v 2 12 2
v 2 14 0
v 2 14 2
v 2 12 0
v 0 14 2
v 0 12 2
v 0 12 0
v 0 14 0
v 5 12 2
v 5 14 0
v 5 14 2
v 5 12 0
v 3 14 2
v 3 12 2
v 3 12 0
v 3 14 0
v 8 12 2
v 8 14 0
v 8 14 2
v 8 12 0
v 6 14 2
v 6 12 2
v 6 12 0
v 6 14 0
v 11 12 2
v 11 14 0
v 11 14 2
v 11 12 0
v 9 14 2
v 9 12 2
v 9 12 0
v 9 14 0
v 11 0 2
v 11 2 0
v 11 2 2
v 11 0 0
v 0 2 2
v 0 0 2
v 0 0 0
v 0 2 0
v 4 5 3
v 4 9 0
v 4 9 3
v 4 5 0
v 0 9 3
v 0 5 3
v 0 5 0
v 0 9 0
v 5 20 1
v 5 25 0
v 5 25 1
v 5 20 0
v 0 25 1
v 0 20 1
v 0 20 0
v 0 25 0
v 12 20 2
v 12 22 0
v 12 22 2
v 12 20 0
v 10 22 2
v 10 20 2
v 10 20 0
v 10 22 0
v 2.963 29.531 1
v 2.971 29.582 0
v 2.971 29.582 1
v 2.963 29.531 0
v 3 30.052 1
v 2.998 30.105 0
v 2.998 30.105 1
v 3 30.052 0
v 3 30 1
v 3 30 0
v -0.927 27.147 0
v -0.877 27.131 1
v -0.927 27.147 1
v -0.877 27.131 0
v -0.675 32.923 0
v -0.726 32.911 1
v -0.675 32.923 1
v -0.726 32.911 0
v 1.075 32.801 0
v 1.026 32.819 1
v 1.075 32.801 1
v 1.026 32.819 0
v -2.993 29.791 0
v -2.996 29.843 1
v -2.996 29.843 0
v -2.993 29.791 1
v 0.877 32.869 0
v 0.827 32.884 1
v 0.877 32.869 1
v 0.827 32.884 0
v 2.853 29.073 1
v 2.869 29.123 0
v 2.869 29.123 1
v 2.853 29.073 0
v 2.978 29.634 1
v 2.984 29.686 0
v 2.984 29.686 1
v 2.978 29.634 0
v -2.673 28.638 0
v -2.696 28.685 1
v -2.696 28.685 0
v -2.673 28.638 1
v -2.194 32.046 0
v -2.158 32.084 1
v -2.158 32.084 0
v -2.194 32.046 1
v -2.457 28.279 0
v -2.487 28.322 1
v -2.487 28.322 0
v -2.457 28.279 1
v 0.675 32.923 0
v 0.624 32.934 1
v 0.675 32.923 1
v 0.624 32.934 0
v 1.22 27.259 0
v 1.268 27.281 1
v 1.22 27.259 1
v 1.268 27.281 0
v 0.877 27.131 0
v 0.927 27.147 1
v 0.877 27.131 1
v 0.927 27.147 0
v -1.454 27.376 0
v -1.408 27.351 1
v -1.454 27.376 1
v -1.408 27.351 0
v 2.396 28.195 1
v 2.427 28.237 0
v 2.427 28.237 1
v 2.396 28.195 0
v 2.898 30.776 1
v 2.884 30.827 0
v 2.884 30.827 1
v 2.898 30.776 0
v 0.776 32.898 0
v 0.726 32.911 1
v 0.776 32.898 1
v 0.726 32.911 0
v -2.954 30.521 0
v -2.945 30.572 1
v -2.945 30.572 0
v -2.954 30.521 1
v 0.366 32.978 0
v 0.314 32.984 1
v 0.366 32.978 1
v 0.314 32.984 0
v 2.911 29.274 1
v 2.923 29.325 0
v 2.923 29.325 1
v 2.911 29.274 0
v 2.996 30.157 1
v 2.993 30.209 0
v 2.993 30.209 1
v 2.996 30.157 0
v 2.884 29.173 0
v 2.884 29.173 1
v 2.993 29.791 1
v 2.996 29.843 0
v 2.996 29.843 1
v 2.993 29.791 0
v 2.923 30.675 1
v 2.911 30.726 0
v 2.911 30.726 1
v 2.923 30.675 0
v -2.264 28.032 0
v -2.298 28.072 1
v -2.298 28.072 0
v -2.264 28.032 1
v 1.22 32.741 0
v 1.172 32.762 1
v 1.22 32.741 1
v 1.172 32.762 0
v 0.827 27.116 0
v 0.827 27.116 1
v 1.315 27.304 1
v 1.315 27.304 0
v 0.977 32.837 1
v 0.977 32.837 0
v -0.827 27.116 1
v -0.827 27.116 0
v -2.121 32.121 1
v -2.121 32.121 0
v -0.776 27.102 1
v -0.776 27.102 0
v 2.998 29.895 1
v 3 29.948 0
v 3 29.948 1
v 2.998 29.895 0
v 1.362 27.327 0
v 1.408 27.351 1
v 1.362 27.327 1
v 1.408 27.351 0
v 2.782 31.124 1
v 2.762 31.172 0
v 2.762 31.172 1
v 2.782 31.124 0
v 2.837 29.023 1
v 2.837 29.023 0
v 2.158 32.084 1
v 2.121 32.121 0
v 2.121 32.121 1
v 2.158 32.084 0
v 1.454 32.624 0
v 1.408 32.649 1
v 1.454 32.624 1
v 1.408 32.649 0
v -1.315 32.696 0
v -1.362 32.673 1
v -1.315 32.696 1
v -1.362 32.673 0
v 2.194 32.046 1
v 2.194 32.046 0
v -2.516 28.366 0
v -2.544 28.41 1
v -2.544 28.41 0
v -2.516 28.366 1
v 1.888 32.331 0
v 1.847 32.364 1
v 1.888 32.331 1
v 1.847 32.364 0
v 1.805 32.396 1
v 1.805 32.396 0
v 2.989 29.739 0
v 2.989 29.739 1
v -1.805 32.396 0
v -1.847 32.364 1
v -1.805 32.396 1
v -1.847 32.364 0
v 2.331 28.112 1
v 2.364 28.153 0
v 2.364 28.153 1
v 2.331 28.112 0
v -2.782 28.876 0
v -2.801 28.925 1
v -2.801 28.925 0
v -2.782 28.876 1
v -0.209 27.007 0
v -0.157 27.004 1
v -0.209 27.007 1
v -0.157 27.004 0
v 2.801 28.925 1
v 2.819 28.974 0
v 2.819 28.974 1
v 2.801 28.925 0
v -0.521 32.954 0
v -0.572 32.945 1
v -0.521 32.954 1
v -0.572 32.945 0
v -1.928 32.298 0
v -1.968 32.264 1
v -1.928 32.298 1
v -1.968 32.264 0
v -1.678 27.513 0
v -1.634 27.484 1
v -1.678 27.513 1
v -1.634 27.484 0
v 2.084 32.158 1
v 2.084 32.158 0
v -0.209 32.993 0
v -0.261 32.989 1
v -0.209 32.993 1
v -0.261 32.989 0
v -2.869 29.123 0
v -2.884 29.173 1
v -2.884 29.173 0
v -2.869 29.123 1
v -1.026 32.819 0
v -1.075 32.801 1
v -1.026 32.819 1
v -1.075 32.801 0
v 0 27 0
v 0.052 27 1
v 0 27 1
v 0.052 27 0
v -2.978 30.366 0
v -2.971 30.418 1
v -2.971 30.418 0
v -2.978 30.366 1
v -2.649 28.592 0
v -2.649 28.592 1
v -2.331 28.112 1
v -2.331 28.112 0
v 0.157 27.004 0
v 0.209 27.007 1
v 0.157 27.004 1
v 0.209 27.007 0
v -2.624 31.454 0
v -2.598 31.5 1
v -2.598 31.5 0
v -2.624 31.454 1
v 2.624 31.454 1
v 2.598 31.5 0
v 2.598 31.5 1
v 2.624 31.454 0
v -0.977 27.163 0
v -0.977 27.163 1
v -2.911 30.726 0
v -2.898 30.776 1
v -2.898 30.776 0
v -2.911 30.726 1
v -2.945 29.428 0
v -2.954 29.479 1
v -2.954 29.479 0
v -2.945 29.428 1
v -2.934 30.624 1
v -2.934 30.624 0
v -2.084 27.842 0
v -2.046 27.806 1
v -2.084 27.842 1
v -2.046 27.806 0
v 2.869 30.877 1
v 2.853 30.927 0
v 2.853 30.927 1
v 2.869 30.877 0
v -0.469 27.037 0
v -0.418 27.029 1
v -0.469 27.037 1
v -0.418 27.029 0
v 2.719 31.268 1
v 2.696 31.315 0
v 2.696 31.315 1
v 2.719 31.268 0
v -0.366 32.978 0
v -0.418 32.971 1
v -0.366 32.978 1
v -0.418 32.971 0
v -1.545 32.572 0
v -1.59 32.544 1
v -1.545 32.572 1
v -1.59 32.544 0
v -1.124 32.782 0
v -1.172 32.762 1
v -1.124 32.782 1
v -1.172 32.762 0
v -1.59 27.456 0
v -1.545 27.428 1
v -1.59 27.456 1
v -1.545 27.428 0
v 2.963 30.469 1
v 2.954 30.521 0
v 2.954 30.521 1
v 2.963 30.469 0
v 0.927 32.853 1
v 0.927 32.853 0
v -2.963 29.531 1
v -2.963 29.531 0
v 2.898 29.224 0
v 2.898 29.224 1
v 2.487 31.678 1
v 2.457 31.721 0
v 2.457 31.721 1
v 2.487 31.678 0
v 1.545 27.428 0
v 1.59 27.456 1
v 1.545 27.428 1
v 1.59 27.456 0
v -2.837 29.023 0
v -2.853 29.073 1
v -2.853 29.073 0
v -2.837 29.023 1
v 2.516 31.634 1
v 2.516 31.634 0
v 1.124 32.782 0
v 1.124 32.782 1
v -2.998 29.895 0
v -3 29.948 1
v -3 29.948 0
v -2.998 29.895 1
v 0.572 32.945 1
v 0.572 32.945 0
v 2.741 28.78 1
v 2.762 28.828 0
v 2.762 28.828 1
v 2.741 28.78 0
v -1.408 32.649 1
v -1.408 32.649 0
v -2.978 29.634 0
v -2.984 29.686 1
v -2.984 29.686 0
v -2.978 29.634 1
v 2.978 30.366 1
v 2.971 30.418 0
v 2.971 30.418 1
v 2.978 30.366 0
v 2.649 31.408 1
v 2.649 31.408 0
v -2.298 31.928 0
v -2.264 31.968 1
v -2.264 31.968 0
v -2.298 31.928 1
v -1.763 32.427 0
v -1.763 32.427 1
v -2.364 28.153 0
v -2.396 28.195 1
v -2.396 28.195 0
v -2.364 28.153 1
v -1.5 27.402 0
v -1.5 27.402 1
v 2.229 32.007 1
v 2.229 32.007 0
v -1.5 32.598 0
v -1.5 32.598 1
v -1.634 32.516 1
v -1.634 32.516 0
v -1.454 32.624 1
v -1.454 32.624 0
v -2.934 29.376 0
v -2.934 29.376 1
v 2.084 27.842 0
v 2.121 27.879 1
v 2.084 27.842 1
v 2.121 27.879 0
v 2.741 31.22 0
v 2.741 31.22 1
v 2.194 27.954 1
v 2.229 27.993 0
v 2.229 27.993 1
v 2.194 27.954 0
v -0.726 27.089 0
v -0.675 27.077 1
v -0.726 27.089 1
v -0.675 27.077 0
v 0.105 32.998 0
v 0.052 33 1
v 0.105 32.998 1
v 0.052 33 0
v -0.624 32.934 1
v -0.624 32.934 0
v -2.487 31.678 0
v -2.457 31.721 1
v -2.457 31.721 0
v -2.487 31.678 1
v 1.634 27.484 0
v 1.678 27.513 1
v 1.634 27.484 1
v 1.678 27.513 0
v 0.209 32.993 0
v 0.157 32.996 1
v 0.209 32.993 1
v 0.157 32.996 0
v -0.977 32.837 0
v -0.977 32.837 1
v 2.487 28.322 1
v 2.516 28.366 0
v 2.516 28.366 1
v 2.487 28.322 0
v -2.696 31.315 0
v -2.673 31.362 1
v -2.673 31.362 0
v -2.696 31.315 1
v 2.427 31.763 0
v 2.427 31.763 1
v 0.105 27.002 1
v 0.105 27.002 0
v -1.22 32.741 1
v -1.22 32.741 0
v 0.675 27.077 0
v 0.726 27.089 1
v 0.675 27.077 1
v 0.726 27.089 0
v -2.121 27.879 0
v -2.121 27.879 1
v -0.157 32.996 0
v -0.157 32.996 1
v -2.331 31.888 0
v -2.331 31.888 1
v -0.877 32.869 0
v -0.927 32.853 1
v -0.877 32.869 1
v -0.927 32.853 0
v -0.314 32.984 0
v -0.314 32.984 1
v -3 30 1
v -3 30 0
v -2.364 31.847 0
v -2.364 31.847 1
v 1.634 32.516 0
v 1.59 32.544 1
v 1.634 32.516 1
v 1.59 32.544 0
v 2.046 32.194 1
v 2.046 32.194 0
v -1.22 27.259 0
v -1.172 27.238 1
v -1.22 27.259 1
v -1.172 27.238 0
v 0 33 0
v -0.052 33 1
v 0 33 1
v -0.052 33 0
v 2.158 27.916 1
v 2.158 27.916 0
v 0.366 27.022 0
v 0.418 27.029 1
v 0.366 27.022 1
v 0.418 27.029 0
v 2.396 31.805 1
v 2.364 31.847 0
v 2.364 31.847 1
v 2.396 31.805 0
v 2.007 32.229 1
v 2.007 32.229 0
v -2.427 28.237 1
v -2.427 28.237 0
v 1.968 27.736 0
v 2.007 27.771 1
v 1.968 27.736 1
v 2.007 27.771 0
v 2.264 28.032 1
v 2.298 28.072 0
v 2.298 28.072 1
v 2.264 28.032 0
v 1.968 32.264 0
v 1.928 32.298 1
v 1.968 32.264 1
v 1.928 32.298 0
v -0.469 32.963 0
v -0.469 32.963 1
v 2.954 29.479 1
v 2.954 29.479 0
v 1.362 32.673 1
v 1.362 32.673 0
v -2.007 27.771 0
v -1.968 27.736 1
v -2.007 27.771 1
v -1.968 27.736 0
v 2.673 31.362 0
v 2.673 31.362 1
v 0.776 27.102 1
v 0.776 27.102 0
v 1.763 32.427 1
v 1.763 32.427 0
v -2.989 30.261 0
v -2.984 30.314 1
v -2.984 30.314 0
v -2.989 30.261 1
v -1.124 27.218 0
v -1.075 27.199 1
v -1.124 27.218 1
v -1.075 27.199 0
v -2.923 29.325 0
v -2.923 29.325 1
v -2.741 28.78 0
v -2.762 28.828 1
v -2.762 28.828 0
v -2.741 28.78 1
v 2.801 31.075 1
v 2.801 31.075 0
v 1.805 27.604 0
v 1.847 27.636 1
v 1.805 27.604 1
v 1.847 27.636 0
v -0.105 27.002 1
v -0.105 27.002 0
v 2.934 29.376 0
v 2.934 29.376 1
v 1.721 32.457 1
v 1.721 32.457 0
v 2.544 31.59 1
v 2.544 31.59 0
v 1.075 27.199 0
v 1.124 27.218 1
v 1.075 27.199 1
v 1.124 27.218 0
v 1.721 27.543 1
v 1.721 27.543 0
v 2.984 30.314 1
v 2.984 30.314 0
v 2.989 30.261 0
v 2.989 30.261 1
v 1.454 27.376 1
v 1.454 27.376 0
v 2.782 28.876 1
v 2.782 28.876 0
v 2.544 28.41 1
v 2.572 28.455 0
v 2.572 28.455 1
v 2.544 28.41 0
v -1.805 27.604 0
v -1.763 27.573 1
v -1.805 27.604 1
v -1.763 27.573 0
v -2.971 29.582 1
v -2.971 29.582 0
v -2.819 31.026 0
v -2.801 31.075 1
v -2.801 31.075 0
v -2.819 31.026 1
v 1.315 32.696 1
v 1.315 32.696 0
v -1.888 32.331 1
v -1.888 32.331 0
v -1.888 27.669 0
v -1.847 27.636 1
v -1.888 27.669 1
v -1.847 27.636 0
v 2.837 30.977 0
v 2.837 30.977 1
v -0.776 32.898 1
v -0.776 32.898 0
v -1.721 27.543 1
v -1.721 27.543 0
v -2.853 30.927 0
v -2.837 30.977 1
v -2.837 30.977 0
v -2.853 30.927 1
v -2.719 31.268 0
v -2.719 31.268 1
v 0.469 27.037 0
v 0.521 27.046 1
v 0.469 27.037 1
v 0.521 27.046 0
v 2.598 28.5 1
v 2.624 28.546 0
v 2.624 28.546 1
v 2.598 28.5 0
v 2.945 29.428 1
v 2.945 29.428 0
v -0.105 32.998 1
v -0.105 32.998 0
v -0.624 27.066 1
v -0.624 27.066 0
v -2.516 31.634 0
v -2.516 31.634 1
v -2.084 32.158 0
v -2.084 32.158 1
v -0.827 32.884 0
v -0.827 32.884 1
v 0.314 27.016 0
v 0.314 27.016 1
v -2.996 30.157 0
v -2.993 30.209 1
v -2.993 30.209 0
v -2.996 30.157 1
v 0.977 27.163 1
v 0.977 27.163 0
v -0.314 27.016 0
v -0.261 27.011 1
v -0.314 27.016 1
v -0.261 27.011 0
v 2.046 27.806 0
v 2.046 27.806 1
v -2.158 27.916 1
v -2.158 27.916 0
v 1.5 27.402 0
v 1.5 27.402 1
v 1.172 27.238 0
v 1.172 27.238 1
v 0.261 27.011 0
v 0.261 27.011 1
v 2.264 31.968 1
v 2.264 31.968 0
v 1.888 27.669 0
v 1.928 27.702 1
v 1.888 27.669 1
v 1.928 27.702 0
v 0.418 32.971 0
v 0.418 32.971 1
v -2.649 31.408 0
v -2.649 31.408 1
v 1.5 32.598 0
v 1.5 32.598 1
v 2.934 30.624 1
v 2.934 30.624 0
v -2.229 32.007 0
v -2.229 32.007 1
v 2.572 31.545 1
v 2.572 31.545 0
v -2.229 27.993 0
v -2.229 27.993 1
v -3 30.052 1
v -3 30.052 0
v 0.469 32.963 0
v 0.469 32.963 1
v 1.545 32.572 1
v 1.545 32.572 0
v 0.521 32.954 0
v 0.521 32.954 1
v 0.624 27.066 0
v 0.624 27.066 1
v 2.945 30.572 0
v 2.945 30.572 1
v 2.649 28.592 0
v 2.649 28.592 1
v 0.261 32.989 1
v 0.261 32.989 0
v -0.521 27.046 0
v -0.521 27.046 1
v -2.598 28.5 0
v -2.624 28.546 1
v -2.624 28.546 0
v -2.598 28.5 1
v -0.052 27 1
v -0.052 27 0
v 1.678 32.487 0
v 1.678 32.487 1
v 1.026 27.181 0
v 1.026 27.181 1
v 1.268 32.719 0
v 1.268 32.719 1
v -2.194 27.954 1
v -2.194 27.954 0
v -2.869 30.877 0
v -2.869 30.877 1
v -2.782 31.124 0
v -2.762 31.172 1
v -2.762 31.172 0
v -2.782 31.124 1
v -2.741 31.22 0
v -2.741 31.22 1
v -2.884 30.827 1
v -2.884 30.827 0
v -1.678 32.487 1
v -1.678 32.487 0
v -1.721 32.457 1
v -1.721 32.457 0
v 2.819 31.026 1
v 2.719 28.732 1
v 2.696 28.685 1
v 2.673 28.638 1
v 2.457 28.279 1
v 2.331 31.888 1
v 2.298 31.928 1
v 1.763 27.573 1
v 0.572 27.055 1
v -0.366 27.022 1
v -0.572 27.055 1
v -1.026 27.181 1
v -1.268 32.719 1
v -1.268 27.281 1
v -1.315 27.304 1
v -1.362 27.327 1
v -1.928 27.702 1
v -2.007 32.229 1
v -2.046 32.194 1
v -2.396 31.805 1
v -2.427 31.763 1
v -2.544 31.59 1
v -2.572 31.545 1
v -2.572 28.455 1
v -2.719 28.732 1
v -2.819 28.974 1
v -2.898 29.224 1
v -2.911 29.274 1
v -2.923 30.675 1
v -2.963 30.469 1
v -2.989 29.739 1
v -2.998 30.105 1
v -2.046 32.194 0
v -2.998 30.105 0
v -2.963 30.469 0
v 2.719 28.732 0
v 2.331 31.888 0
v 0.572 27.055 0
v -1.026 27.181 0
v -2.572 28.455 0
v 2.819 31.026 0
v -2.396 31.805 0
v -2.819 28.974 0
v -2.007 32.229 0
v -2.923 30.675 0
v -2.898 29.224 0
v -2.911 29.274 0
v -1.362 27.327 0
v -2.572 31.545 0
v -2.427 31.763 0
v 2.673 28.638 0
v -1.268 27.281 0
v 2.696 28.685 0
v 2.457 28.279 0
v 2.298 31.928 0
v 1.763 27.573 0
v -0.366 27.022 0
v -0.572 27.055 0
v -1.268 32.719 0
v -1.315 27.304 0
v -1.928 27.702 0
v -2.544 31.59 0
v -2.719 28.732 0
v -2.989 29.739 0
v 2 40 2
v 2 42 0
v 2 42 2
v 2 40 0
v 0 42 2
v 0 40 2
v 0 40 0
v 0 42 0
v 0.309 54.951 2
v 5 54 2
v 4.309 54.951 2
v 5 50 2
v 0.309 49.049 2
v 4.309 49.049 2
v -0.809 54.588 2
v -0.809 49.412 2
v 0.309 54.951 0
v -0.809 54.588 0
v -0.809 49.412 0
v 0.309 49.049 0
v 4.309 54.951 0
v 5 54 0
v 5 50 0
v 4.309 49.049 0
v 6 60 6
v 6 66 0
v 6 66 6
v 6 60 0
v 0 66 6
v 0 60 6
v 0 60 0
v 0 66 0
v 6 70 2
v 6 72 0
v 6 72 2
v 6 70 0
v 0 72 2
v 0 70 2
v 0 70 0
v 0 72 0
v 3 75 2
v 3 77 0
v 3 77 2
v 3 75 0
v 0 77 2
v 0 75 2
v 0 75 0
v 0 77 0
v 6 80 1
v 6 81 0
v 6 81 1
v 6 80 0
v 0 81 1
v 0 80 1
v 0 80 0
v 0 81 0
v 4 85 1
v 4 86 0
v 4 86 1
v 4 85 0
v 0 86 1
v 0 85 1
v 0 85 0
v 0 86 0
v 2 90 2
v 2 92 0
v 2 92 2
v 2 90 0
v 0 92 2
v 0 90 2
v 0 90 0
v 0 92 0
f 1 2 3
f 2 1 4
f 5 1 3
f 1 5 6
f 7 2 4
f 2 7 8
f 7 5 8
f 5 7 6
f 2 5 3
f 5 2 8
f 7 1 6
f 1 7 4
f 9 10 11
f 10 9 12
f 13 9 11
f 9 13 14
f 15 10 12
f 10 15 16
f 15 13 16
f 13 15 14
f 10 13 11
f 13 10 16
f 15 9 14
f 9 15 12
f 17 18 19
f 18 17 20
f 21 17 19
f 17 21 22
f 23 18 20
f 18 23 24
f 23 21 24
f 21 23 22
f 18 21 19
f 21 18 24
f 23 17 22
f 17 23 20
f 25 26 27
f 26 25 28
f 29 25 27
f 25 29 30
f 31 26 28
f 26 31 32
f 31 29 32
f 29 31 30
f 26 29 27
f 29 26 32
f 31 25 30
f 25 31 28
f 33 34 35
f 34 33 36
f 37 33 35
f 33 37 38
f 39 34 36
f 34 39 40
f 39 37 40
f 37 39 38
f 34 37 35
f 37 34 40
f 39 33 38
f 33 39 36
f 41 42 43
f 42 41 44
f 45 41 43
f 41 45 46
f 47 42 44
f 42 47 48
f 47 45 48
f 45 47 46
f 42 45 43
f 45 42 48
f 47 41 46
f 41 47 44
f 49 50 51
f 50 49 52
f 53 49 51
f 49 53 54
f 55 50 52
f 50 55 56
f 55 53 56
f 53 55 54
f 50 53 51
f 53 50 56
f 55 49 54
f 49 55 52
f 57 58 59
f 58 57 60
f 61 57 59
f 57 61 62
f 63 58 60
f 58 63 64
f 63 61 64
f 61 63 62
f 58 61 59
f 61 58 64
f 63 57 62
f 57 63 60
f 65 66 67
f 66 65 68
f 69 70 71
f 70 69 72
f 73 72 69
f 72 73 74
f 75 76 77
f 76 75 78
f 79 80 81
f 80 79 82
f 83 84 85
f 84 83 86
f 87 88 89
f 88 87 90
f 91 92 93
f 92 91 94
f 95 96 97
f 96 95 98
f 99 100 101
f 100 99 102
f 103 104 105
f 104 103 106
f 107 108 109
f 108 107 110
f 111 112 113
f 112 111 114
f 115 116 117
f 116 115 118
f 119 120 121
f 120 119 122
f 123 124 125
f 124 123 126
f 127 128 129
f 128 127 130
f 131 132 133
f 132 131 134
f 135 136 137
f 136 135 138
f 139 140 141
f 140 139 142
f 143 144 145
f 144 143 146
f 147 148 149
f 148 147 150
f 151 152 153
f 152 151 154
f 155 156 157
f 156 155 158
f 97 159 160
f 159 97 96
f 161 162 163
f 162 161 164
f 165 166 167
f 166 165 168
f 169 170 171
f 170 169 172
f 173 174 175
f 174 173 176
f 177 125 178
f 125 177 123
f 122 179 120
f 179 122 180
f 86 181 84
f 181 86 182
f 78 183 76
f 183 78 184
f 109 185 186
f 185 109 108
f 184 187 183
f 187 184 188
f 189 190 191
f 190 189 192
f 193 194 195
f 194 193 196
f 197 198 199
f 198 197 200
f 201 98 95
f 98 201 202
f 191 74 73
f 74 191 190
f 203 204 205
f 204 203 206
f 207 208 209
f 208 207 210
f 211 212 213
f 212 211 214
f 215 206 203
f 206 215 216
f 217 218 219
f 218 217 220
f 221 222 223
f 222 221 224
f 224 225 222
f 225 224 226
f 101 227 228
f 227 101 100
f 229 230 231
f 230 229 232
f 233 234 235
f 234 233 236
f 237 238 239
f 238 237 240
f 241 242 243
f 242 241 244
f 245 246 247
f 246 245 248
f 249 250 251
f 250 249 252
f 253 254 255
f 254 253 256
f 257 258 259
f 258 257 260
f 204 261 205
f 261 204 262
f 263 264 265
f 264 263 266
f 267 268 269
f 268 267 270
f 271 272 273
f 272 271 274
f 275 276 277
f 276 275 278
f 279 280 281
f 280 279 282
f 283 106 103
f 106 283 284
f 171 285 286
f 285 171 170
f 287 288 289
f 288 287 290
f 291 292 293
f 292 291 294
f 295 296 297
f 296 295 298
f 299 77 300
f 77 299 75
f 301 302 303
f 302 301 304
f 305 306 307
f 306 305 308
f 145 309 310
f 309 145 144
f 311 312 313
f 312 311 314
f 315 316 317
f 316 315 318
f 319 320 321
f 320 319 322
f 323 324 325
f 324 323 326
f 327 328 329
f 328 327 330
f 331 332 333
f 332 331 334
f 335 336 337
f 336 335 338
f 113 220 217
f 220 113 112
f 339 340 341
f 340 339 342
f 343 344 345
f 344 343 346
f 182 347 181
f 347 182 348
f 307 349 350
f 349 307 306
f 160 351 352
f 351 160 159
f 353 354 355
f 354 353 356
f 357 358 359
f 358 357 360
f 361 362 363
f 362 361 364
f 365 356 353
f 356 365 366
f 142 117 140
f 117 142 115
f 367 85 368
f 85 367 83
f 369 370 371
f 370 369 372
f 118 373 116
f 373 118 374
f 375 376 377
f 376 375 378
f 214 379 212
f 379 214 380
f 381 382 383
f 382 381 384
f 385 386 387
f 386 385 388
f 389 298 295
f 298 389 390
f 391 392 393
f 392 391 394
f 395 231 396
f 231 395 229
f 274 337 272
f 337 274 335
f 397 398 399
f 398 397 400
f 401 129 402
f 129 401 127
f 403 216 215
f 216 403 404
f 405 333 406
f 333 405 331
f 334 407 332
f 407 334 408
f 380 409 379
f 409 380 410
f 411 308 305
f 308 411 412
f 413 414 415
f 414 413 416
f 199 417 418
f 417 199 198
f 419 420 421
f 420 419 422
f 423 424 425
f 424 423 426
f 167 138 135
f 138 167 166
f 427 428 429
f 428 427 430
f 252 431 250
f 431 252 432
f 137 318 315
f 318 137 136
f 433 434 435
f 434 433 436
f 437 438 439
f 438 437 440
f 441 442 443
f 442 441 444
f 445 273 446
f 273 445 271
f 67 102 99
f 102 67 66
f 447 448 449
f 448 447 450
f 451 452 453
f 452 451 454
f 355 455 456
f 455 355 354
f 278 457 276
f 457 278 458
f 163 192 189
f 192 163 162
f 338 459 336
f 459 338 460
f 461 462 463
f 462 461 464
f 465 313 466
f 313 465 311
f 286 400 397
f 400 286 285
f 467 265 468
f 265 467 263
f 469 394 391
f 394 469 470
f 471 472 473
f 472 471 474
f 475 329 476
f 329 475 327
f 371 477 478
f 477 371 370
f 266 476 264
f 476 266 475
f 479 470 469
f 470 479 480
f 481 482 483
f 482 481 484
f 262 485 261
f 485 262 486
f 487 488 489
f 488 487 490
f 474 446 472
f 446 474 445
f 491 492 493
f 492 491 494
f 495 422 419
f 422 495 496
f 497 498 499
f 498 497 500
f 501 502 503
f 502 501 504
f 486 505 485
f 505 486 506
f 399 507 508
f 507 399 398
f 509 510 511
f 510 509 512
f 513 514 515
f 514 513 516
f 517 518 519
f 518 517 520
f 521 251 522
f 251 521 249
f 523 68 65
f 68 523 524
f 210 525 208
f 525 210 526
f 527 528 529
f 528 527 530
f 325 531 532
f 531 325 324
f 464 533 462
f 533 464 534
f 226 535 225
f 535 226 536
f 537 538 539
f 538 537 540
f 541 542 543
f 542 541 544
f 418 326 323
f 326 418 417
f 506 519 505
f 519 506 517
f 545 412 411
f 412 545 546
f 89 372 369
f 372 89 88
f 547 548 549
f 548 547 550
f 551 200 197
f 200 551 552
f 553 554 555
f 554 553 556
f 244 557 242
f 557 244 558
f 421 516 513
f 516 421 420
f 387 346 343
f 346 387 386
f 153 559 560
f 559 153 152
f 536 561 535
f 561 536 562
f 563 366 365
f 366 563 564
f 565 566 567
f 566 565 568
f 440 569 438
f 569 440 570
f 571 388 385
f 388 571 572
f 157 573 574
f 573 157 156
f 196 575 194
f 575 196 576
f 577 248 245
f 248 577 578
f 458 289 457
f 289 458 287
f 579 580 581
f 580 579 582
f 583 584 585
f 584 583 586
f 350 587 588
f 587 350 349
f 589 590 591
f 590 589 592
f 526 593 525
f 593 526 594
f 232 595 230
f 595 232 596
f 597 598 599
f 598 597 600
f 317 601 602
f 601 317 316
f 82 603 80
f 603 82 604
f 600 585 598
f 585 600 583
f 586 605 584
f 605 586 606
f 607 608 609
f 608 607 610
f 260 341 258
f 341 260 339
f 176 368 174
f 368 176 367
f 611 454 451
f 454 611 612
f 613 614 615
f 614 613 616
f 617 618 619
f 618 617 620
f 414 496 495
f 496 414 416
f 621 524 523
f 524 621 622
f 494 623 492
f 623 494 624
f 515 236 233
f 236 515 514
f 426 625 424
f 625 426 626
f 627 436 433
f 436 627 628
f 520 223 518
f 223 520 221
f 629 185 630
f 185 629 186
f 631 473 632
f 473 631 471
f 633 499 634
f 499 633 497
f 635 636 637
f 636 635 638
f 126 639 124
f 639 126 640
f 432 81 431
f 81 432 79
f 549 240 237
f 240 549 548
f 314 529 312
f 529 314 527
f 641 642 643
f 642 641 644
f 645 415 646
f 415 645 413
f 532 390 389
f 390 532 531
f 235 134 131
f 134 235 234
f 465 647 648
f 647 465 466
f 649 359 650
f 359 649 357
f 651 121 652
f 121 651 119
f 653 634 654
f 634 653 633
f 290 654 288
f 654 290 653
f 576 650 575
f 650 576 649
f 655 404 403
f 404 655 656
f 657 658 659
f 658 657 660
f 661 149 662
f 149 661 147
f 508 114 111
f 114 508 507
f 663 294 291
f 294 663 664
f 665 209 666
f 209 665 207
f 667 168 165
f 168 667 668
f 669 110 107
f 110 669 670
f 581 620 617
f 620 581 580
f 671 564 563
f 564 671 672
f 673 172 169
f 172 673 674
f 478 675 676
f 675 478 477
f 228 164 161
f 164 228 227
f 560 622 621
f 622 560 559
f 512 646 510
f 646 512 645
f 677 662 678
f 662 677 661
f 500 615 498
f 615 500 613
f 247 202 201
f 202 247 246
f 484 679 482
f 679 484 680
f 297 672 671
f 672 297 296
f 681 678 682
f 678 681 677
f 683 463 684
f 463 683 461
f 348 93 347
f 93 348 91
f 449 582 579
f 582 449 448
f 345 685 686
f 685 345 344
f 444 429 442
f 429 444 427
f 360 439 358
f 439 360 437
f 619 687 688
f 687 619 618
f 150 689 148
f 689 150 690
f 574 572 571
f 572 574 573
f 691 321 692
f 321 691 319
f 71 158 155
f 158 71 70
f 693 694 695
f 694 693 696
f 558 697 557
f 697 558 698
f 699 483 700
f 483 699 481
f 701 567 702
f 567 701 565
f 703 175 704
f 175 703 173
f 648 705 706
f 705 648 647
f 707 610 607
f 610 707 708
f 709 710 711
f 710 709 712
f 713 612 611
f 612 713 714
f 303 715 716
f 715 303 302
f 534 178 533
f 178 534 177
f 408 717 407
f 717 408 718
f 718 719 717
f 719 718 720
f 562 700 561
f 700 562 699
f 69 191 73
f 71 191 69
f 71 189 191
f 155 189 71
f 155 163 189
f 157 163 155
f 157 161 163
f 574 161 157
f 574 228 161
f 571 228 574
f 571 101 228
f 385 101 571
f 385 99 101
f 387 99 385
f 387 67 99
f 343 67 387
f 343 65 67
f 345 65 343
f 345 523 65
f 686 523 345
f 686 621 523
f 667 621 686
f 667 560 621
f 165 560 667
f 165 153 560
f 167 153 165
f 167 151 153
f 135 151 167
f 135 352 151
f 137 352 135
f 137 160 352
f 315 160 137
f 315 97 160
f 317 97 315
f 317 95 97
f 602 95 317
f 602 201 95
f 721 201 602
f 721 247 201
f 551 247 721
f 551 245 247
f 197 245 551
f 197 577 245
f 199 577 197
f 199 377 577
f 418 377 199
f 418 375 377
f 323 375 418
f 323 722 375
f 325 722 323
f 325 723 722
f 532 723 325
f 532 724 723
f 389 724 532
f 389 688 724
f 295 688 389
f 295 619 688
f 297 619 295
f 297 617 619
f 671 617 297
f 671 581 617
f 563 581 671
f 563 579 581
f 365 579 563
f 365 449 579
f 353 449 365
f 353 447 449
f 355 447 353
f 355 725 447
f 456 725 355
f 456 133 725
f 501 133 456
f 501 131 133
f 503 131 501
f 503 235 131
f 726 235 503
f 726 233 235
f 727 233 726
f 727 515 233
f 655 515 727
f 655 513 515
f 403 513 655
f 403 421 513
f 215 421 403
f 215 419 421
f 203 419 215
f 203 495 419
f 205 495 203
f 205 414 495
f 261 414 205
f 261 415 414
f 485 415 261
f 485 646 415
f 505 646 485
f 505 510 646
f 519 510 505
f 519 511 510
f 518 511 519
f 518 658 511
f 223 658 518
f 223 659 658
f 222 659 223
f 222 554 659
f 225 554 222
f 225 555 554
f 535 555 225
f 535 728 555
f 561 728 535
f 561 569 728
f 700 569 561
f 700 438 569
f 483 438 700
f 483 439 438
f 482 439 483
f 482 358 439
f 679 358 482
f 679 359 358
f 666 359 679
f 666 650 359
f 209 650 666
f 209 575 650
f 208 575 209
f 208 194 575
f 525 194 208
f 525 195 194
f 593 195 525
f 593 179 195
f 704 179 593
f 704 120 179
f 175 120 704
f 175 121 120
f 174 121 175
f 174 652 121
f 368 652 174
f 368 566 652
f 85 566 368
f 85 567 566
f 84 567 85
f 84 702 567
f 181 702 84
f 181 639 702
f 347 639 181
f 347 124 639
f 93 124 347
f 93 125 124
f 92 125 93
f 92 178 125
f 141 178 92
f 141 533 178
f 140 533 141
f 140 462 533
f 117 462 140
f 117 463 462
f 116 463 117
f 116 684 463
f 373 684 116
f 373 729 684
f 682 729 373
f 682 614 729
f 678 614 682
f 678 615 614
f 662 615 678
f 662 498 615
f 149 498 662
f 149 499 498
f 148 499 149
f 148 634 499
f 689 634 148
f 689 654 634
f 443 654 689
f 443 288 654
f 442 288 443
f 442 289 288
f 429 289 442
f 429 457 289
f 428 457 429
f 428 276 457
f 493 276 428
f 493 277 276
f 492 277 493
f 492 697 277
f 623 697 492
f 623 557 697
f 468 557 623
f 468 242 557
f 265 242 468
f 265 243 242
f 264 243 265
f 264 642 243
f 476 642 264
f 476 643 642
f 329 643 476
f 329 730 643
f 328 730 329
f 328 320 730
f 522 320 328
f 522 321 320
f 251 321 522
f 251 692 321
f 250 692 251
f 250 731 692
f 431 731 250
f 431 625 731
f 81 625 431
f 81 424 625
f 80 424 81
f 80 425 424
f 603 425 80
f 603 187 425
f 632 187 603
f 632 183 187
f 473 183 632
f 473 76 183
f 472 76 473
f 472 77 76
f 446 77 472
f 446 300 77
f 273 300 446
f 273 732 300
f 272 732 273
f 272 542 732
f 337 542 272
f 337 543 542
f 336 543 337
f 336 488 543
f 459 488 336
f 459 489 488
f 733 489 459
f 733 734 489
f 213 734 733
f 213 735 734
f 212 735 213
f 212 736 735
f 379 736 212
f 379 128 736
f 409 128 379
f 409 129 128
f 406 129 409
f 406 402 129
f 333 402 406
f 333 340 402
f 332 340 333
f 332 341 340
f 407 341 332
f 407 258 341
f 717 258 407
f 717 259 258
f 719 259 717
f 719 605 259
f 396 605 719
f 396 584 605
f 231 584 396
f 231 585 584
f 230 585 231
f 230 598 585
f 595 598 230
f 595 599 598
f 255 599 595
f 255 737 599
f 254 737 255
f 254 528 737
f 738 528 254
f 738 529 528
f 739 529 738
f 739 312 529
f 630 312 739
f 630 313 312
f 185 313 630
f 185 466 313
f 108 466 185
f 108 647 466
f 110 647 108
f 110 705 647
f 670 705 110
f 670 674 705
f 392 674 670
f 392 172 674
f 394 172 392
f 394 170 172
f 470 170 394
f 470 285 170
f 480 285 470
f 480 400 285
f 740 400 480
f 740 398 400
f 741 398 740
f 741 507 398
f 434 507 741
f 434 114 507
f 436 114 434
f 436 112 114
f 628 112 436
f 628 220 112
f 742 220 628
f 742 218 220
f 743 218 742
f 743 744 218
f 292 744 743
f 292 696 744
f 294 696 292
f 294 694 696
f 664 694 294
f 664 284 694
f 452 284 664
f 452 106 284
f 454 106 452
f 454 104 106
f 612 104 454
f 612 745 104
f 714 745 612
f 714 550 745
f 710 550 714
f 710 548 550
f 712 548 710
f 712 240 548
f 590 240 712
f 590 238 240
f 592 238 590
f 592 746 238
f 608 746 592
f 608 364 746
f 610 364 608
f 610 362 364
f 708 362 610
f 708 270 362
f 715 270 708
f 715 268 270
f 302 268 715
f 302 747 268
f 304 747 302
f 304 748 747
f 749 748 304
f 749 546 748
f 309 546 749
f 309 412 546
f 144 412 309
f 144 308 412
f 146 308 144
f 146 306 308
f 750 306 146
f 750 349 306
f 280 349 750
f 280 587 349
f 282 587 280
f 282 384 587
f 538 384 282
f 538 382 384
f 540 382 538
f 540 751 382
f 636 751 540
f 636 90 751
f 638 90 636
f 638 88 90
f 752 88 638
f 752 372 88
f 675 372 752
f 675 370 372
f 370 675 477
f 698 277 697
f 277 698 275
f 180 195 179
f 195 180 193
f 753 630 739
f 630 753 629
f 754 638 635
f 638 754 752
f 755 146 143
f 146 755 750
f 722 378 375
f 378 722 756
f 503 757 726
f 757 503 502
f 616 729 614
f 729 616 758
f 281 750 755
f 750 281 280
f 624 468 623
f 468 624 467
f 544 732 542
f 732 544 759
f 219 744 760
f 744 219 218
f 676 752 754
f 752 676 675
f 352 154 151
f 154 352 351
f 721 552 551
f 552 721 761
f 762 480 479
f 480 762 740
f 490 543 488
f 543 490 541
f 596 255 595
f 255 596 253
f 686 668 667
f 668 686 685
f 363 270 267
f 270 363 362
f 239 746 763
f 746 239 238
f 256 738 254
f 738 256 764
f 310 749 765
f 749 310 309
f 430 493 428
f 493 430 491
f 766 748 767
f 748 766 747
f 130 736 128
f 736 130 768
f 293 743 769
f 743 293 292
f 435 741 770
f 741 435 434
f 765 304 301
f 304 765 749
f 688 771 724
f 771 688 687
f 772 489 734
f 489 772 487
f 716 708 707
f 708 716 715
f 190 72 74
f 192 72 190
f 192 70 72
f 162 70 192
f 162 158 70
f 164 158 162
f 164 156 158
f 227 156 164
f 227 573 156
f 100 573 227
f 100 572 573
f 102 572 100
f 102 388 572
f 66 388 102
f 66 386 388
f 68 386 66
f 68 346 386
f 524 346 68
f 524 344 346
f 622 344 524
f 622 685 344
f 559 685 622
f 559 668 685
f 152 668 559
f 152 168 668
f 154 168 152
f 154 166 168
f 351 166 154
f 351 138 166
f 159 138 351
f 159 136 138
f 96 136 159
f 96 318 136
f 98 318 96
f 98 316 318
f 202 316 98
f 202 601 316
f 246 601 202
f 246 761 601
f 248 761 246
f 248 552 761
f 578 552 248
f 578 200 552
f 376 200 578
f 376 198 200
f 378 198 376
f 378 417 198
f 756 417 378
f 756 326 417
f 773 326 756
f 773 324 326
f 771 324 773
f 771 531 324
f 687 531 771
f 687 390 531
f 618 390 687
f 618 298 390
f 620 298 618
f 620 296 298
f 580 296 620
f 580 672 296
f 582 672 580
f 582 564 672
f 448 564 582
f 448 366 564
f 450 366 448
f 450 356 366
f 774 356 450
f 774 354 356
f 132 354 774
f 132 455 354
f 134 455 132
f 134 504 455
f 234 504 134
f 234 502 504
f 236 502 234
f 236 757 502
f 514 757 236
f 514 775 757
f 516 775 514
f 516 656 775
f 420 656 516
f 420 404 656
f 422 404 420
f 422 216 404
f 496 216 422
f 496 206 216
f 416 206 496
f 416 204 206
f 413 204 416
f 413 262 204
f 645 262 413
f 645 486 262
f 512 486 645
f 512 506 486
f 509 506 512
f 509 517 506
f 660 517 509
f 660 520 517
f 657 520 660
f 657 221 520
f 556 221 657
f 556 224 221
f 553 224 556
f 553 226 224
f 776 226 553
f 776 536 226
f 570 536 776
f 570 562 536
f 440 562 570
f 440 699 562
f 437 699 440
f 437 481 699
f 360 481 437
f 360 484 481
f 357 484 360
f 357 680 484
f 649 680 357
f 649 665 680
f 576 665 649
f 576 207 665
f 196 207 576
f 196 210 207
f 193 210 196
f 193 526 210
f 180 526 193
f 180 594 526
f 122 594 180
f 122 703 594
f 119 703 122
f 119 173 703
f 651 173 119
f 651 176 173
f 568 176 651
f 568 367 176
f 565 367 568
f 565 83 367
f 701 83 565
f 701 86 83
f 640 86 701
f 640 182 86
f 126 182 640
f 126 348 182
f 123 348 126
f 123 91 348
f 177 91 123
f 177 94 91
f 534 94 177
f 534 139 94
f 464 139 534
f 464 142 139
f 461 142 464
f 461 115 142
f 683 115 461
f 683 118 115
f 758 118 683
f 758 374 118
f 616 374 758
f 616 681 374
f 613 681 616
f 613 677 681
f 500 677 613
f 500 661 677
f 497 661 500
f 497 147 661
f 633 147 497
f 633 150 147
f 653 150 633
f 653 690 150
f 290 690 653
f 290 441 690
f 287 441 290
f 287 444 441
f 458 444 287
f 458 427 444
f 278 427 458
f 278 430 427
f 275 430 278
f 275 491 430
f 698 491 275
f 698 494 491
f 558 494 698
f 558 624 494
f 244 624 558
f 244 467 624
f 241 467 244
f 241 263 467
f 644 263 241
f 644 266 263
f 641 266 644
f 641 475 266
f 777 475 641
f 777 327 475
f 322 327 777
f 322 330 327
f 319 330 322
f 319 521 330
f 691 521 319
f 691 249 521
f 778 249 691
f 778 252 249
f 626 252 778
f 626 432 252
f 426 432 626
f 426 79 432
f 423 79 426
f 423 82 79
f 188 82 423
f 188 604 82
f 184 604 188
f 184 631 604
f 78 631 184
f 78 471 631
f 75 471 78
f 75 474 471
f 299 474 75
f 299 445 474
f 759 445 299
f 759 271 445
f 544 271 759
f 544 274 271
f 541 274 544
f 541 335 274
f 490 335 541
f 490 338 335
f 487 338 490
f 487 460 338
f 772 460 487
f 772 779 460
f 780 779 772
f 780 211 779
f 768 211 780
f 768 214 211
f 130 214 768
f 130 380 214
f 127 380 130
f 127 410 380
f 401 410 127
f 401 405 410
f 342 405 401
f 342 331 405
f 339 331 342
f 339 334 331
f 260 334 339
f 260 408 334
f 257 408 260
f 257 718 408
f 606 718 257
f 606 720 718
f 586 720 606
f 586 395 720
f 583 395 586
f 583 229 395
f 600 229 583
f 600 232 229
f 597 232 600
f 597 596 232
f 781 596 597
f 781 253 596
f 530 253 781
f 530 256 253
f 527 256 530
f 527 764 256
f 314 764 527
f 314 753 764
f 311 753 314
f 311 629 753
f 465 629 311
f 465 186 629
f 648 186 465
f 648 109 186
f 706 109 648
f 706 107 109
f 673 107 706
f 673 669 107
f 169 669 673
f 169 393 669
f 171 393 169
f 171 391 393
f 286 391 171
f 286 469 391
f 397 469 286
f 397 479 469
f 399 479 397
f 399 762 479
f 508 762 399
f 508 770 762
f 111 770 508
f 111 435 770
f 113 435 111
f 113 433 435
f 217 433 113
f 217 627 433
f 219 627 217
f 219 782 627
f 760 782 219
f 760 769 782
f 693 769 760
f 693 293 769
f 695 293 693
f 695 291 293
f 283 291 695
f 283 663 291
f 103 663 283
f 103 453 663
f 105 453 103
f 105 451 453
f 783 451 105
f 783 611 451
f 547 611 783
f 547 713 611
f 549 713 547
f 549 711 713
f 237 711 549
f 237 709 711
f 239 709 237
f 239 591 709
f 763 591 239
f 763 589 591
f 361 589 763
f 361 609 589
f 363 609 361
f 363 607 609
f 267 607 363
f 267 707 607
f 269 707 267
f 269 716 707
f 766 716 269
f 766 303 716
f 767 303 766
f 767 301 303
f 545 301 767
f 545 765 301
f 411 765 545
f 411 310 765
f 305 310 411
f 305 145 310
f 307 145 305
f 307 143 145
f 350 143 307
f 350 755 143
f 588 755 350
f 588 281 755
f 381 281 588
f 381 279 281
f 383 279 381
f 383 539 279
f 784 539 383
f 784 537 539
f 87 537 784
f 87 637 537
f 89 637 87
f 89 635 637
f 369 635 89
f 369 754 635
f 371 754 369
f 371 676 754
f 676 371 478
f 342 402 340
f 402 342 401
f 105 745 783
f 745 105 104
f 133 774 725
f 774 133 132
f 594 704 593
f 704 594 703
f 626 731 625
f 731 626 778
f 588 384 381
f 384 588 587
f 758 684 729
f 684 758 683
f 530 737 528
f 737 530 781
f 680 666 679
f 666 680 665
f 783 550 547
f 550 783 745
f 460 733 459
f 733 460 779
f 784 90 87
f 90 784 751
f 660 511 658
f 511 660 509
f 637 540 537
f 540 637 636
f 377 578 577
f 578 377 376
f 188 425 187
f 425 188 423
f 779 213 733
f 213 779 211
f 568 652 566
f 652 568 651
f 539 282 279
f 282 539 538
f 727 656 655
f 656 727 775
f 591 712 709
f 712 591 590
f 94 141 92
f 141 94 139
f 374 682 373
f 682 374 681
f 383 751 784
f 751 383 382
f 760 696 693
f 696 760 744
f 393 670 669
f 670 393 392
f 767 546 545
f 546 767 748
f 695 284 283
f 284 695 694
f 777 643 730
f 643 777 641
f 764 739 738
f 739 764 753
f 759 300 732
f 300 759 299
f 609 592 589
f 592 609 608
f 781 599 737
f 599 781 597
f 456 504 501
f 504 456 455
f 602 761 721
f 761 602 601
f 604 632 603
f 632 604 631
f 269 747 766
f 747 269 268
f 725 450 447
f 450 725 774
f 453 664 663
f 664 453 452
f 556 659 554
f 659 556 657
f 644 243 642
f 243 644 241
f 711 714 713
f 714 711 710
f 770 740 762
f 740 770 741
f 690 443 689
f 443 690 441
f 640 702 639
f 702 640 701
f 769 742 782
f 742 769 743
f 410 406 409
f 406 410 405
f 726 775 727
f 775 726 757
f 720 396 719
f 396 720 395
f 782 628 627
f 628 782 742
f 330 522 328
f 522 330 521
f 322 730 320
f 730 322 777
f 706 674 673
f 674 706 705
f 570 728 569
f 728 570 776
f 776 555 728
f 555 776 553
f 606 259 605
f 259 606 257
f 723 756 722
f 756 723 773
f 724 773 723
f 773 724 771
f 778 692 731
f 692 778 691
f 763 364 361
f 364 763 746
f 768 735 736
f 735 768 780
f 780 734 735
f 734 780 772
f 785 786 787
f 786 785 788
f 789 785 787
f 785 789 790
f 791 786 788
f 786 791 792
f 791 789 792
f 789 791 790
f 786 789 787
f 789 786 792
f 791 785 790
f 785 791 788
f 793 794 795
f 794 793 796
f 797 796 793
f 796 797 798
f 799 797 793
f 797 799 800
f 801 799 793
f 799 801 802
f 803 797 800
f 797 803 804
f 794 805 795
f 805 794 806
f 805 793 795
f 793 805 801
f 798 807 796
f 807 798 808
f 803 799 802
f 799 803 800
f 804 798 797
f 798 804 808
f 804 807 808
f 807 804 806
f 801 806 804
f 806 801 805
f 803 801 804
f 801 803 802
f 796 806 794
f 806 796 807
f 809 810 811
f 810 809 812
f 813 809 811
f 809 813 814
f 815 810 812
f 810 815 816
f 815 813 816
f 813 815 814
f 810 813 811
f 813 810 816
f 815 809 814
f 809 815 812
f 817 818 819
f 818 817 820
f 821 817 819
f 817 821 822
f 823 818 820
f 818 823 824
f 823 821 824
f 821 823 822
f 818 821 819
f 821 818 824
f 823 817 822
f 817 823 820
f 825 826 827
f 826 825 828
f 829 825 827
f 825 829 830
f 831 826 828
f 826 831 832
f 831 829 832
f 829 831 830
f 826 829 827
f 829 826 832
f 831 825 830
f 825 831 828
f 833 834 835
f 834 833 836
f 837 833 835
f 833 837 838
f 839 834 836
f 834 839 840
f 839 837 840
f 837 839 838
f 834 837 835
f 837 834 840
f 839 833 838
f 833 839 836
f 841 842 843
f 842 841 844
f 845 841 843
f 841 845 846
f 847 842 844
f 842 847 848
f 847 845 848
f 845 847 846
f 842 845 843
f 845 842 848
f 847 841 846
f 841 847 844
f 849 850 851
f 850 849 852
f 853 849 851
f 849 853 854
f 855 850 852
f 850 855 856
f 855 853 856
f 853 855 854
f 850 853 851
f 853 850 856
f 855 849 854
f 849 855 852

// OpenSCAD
// OpenSCAD's scoping and calling rules that Python does not share — each failed real files' builds
PAD = 1;
x = half(20);                                     // a function used above its declaration
function half(v, extra = PAD) = v / 2 + extra;    // a default that is not a constant: read at call time
cube([x, 2, 2]);                                  // 11 x 2 x 2

module slab(t = T) translate([0, 5, 0]) cube([4, 4, t]);   // a module default sees an assignment below it
T = 3;
slab();

slots = 3;                                        // a variable, a module and a function, one name
module slots(n) for (i = [0 : n - 1]) translate([i * 3, 12, 0]) cube(2);
function slots(k) = k + 1;
slots(slots(slots));                              // four cubes

module plate(w) translate([0, 20, 0]) cube([w, w, 1]);
plate(5, 99, 100);                                // extra unnamed arguments are ignored
module bare() translate([10, 20, 0]) cube(2);
bare(7);                                          // … even by a module with no parameters

module ring(r) translate([0, 30, 0]) cylinder(r = r, h = 1);
ring(3, $fn = 360);                               // $fn on a call to a user module

module assembly() translate([0, 40, 0]) cube(2);  // model.py's own export name
assembly();

translate([0, 50, 0]) minkowski() { w = 6 - 2; cube([w, w, 1]); cylinder(r = 1, h = 1); }

module holder() { d = size(3); translate([0, 60, 0]) cube([d, d, d]); function size(k) = k * 2; }
holder();                                         // a module-local function used above its declaration

module tag() translate([0, 70, 0]) cube([w, 2, 2]);   // w is no parameter: a caller's `w =` binds inside
w = 3;
tag(w = 6);
translate([0, 5, 0]) tag();                           // … and the global w when nobody passes one
function scaled(v) = v * k;                           // the same for a function
k = 2;
translate([0, 80, 0]) cube([scaled(2, k = 3), 1, 1]);
translate([0, 85, 0]) cube([scaled(2), 1, 1]);
module sized(size) translate([0, 90, 0]) cube(size);
sized(size = 2, sizee = 3);                           // a misspelled parameter: warned, no effect
